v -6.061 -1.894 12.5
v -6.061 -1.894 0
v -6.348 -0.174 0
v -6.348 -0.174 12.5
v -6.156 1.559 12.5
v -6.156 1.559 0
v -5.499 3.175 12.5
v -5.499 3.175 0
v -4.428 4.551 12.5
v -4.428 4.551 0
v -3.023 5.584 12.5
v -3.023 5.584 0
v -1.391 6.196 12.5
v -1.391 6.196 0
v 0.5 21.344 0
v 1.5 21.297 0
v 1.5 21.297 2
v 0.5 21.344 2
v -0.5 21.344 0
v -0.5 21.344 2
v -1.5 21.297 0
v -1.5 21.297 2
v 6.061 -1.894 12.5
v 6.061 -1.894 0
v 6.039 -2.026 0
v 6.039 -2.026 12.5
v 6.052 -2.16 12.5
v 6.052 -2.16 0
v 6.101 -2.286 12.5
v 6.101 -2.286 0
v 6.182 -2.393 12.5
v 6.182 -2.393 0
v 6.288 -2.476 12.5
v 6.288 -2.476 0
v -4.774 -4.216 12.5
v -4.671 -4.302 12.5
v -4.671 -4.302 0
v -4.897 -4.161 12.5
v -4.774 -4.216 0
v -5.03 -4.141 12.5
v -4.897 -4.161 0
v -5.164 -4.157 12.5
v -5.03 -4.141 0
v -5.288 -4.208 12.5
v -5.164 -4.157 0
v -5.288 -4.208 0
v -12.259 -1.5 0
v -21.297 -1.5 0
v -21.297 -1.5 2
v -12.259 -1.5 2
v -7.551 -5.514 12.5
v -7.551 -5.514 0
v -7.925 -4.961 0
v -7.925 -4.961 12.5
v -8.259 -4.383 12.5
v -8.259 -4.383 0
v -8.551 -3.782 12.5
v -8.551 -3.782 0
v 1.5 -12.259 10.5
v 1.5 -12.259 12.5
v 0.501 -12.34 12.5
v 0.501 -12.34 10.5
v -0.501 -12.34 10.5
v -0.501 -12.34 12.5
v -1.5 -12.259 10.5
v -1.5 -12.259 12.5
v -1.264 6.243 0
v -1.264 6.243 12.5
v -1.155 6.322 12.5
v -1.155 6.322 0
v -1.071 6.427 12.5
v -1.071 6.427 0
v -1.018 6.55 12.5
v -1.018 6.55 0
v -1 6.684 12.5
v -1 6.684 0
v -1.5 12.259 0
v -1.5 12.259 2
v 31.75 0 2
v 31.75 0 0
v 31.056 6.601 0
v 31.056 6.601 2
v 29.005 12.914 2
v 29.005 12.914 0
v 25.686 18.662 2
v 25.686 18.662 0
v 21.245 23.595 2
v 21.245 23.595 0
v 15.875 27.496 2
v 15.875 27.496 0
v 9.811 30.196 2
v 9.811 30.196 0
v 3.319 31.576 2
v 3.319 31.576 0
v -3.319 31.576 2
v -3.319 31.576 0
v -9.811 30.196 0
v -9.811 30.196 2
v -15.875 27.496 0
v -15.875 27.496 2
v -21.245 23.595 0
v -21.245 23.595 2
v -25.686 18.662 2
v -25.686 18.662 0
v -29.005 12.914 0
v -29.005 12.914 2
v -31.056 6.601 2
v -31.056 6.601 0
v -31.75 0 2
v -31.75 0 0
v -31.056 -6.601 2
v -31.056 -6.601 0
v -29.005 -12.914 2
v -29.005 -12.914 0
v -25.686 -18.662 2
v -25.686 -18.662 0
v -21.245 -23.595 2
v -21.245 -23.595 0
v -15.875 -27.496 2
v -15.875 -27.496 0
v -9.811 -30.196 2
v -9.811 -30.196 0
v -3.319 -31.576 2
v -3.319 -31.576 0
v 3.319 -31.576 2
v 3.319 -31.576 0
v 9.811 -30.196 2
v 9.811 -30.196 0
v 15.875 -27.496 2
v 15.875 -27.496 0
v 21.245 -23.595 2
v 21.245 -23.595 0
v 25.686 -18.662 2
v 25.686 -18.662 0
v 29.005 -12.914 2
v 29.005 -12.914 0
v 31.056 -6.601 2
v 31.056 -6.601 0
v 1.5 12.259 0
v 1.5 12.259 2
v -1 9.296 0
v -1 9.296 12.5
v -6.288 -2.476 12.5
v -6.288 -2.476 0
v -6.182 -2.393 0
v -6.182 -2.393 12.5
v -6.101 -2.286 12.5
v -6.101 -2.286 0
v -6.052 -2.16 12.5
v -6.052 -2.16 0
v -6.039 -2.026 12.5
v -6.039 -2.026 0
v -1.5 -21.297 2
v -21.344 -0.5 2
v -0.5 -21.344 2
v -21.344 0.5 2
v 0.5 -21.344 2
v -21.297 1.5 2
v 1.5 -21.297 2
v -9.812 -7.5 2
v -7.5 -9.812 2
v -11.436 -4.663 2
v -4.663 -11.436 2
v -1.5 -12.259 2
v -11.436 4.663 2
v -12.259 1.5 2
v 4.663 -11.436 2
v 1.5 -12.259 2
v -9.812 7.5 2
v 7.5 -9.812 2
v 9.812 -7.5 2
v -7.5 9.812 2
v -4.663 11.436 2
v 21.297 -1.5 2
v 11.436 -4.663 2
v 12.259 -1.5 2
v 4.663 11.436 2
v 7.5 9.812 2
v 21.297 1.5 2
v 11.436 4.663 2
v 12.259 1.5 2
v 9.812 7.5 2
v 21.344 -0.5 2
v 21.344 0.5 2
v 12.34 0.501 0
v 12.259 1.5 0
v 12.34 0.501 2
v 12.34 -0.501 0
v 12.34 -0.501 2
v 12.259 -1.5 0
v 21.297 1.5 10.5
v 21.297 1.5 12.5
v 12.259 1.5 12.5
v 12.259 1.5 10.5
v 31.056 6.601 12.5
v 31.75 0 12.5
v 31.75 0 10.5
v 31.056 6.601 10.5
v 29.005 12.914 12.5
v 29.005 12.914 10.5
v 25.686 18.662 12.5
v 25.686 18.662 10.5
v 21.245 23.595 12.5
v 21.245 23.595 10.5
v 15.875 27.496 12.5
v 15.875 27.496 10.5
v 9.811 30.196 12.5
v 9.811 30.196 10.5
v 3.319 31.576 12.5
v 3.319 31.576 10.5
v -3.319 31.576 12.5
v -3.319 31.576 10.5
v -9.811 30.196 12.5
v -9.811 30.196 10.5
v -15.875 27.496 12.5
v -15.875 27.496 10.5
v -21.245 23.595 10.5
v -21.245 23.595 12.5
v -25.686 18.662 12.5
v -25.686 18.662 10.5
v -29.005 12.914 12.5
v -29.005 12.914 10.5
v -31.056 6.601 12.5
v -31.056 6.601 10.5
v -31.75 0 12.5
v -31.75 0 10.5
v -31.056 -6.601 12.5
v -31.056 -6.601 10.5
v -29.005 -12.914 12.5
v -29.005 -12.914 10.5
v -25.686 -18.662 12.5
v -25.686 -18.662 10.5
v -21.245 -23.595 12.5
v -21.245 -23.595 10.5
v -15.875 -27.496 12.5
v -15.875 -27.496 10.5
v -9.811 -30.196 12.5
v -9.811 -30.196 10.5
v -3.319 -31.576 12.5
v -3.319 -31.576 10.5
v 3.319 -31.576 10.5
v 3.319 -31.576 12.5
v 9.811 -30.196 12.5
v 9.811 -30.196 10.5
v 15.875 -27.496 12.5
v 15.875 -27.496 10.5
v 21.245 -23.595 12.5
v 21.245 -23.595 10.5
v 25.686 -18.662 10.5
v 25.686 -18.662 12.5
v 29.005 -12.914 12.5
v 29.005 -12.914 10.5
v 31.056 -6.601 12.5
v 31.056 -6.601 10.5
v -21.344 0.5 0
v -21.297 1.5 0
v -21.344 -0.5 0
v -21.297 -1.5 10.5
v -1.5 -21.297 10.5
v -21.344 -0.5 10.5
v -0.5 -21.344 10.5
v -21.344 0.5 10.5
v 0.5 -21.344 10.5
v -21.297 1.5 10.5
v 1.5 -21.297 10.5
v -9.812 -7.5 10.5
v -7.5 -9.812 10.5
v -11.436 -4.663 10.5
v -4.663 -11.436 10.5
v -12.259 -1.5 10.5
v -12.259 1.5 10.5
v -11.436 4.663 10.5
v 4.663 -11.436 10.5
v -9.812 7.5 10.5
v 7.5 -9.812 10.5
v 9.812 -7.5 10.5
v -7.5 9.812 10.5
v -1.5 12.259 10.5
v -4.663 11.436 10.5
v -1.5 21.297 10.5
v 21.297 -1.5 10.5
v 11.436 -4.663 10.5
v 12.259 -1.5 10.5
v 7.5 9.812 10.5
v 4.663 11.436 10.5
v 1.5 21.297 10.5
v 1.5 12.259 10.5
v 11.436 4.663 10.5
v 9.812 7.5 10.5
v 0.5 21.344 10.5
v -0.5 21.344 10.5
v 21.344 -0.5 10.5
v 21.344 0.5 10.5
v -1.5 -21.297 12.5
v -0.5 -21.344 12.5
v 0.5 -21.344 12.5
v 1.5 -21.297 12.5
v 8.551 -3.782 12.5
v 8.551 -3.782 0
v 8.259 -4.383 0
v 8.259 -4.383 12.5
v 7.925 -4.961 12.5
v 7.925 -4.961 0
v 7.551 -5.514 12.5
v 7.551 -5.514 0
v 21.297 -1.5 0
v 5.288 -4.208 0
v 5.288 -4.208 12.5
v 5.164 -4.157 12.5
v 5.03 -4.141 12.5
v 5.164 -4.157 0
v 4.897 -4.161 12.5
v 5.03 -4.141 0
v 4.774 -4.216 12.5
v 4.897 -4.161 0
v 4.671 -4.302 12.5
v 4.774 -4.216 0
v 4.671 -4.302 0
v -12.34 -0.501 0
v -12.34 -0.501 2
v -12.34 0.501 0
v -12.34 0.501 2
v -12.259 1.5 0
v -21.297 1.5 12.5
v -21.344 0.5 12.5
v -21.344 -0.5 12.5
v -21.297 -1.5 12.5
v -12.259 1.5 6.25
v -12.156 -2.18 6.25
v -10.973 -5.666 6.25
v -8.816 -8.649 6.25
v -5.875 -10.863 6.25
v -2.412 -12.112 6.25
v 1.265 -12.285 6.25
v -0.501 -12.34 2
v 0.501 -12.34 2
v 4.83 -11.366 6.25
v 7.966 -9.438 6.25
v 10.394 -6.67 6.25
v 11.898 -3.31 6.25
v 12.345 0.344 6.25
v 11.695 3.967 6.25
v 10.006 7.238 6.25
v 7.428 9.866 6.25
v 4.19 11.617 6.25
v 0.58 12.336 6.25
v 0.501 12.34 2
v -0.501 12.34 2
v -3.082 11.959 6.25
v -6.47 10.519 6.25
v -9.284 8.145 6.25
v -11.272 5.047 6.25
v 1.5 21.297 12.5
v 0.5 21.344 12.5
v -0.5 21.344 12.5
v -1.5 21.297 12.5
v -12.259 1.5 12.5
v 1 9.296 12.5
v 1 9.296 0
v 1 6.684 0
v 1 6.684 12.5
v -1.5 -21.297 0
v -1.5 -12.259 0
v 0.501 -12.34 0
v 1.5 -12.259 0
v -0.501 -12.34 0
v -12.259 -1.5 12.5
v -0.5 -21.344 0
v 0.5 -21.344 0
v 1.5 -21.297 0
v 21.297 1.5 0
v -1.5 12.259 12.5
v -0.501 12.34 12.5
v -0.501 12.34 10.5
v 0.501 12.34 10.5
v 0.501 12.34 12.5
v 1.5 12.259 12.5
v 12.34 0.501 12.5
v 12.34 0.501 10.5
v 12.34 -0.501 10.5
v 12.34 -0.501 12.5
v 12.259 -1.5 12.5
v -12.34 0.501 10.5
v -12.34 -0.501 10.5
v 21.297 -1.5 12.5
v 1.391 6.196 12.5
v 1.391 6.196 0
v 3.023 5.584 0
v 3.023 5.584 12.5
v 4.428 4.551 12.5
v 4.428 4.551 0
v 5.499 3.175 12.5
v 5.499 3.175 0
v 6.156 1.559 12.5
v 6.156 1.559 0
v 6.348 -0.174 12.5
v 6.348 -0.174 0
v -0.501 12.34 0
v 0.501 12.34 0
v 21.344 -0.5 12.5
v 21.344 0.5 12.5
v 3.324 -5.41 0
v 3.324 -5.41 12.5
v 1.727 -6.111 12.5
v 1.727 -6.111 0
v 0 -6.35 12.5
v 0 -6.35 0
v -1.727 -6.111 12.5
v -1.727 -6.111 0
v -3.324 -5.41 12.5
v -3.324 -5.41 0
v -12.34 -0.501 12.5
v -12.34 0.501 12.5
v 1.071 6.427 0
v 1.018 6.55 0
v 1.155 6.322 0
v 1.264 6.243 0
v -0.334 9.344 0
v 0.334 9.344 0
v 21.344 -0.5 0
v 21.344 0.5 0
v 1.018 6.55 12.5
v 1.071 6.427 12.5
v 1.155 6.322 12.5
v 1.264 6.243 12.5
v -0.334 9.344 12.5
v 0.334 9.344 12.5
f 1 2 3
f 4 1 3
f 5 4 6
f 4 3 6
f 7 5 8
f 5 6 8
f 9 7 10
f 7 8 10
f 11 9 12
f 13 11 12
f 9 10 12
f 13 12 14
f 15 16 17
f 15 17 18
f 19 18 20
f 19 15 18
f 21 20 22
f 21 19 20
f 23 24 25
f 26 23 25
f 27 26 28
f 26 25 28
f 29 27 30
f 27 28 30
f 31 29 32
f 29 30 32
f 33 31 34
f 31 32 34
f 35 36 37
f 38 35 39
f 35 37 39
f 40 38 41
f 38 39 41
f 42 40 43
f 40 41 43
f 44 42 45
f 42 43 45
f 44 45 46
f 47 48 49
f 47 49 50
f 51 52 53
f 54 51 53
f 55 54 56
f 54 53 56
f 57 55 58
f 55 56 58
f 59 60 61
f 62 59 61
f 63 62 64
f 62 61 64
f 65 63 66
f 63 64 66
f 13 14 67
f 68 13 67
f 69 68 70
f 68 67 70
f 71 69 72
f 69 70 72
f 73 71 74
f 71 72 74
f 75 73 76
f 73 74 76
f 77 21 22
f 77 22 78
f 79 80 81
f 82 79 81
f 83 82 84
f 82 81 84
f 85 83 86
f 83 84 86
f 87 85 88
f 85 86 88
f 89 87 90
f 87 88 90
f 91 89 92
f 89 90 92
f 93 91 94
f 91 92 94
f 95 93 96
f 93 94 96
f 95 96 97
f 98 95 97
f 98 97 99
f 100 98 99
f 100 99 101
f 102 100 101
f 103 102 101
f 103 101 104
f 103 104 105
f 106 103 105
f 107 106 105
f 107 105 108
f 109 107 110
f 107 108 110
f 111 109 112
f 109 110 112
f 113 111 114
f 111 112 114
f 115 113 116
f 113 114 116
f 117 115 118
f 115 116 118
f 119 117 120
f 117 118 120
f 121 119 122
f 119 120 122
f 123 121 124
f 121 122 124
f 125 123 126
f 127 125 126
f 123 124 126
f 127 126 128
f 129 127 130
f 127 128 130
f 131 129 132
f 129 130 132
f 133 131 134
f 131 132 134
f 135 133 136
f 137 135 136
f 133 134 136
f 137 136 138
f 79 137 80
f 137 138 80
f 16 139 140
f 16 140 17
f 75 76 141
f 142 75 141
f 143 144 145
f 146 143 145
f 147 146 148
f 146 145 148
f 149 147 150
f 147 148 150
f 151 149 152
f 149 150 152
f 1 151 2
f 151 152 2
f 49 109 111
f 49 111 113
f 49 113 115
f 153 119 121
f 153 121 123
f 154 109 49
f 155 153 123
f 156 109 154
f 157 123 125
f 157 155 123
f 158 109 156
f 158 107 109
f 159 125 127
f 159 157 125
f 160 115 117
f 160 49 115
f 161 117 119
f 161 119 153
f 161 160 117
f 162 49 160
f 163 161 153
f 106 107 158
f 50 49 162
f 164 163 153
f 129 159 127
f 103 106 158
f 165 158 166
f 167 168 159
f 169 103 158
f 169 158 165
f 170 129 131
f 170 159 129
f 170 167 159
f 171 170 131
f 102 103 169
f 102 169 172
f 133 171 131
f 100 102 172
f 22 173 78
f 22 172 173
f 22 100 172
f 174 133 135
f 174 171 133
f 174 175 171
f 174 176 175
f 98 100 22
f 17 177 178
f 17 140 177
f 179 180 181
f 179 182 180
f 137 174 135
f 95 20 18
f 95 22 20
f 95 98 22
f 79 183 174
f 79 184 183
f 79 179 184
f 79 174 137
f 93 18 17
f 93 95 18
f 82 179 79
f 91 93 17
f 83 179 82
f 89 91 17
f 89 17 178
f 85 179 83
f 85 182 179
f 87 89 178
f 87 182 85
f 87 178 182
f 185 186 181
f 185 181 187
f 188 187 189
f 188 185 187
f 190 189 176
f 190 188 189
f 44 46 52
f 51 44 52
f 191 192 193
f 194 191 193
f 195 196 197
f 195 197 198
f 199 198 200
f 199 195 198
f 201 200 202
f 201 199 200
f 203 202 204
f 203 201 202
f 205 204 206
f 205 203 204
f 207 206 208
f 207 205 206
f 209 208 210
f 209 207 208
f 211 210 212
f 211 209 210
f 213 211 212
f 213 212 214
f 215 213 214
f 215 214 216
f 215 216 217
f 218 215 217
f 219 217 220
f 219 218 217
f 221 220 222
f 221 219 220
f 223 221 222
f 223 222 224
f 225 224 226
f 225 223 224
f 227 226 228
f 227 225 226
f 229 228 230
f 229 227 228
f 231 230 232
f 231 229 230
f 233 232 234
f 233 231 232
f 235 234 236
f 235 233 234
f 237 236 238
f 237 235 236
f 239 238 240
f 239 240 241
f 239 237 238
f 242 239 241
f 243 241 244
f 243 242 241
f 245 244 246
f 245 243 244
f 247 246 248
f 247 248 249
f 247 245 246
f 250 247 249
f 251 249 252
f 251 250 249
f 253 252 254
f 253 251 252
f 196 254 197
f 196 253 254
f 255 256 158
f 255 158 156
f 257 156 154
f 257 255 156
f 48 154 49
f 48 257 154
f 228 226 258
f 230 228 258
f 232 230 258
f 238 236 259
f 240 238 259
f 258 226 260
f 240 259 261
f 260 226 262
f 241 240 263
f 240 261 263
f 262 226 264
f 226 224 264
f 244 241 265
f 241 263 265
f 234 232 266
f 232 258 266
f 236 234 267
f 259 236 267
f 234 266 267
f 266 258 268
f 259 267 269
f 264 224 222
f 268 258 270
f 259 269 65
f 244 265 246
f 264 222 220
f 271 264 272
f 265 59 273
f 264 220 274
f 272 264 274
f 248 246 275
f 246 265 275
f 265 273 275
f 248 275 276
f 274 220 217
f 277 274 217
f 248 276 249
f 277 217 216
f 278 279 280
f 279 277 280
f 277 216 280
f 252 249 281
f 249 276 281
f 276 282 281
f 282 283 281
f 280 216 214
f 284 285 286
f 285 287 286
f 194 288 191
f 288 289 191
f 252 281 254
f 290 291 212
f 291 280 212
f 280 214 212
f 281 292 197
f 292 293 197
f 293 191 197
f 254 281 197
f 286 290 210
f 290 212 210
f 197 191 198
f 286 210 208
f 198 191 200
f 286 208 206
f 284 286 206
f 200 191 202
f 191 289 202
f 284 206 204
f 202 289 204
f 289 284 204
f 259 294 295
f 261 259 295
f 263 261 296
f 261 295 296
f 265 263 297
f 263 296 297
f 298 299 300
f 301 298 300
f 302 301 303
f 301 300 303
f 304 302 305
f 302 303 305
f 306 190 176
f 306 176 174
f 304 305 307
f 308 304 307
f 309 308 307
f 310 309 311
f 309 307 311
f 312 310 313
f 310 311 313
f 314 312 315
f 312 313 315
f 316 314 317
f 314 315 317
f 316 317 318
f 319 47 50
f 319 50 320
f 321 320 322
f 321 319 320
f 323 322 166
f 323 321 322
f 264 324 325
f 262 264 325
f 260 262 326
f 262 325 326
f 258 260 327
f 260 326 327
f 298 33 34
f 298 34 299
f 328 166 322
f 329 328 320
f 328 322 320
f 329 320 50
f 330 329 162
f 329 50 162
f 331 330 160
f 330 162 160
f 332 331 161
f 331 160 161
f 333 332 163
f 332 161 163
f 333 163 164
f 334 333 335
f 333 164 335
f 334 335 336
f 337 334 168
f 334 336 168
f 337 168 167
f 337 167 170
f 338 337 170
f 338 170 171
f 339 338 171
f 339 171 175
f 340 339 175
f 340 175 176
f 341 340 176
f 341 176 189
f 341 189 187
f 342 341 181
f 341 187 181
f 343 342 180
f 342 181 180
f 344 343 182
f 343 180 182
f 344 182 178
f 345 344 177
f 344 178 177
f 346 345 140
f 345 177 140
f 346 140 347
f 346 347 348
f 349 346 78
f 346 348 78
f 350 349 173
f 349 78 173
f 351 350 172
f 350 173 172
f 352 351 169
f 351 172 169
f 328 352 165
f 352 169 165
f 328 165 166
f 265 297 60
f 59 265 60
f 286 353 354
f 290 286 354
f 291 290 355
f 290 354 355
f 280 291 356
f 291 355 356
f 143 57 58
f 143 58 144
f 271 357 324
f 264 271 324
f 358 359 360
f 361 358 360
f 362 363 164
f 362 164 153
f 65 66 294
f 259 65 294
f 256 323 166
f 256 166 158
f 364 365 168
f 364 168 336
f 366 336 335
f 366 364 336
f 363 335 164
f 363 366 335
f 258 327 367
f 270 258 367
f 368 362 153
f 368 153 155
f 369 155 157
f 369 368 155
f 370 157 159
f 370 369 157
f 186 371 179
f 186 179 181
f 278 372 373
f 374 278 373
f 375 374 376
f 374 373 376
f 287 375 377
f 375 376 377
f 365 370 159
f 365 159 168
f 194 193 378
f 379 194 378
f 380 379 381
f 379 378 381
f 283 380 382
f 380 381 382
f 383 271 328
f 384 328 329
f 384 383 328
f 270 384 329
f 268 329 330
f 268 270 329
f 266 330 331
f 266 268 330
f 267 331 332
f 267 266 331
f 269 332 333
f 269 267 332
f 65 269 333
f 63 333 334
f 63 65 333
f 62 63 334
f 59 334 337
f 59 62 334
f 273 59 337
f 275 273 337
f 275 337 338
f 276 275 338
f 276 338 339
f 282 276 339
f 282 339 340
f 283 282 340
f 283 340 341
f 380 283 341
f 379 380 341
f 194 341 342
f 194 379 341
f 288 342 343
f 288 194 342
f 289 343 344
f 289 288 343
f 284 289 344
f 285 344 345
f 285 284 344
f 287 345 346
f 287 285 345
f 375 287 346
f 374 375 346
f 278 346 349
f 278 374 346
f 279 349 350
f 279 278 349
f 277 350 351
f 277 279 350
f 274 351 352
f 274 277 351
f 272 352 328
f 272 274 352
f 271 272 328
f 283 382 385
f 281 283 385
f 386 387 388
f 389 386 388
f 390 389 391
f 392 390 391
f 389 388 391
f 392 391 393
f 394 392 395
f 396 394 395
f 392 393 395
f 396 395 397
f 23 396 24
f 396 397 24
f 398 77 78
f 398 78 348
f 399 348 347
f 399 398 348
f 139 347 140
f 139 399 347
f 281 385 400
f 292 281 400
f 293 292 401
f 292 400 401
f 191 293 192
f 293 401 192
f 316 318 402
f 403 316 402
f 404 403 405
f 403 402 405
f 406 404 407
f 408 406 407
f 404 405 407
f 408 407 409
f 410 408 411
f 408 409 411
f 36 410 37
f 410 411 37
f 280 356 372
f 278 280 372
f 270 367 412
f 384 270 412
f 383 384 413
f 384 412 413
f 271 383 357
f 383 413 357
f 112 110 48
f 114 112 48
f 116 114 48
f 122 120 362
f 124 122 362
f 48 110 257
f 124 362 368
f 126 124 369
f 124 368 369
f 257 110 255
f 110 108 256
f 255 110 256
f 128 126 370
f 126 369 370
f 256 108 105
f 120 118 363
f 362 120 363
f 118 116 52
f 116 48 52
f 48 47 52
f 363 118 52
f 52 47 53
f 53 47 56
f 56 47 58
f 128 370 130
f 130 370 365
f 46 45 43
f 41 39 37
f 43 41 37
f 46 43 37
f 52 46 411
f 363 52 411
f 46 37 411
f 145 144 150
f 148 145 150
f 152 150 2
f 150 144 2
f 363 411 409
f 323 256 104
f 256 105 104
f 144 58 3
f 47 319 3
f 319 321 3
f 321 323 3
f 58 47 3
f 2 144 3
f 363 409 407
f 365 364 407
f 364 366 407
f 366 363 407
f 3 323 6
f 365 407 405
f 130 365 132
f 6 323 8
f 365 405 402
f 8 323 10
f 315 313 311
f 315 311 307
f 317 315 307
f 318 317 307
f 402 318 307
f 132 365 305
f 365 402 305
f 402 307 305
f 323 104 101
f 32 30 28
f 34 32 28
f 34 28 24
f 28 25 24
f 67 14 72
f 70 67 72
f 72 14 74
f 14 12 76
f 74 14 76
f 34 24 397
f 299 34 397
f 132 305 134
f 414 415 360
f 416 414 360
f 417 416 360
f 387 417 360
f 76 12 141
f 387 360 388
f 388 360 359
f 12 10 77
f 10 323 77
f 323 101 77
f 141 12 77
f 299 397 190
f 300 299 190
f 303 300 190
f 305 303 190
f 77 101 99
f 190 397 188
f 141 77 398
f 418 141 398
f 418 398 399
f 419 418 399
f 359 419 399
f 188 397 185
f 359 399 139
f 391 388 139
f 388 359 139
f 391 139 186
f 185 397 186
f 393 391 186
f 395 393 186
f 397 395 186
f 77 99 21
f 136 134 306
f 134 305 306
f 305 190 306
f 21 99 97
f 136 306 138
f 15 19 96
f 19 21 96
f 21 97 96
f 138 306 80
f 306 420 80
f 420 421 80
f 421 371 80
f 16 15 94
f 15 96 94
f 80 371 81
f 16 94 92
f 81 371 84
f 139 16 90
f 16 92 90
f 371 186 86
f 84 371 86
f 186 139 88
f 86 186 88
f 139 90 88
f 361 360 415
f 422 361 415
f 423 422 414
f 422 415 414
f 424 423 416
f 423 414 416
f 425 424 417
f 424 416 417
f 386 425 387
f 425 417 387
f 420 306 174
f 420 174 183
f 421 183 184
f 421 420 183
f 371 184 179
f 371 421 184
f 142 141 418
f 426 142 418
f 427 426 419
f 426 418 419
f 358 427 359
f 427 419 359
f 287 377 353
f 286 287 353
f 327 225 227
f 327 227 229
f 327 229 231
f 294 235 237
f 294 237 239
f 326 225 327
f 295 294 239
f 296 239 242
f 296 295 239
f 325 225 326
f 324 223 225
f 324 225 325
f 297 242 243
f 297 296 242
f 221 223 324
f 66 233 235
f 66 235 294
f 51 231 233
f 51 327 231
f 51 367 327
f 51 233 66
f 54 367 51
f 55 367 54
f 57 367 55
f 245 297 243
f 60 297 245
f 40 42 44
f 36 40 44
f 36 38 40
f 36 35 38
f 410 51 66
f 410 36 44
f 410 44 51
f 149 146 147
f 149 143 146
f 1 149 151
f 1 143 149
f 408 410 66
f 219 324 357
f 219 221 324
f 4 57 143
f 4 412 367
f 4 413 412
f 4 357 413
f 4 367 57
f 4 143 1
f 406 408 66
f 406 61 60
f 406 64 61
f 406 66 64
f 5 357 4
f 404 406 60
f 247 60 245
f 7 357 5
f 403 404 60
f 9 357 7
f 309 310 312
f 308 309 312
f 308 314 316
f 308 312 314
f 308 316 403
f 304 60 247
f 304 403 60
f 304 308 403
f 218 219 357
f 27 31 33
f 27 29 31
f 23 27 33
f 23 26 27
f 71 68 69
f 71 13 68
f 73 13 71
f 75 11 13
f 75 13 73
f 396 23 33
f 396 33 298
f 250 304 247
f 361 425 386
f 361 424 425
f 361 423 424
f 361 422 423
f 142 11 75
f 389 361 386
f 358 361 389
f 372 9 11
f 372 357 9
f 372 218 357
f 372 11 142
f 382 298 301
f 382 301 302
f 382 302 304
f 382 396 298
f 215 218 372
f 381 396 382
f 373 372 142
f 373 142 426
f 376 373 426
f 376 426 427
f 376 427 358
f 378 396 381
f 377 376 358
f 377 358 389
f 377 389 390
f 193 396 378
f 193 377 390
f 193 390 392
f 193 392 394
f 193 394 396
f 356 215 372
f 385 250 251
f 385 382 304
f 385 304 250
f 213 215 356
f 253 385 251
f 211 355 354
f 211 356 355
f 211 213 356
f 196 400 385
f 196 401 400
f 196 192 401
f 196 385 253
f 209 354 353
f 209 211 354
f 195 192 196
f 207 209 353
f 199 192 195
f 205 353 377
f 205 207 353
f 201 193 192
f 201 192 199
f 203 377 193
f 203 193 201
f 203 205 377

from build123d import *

# Parameters (mm, degrees)
SKETCH1_R           = 31.75
BOSS_EXTRUDE1_DEPTH = 2
SKETCH3_R           = 12.35
BOSS_EXTRUDE3_DEPTH = 4.25
CUT_EXTRUDE1_DEPTH  = 47.608743815


with BuildPart() as part:
    # Sketch1 → Boss-Extrude1 (new body)
    with BuildSketch(Plane.XY):
        Circle(SKETCH1_R)
        with BuildLine():
            Line((1.5, 12.258568432), (1.5, 21.297241605))
            ThreePointArc((1.5, 21.297241605), (0, 21.35), (-1.5, 21.297241605))
            Line((-1.5, 21.297241605), (-1.5, 12.258568432))
            ThreePointArc((-1.5, 12.258568432), (0, 12.35), (1.5, 12.258568432))
        make_face(mode=Mode.SUBTRACT)
        with BuildLine():
            Line((-12.258568432, 1.5), (-21.297241605, 1.5))
            ThreePointArc((-21.297241605, 1.5), (-21.35, 0), (-21.297241605, -1.5))
            Line((-21.297241605, -1.5), (-12.258568432, -1.5))
            ThreePointArc((-12.258568432, -1.5), (-12.35, 0), (-12.258568432, 1.5))
        make_face(mode=Mode.SUBTRACT)
        with BuildLine():
            Line((-1.5, -12.258568432), (-1.5, -21.297241605))
            ThreePointArc((-1.5, -21.297241605), (0, -21.35), (1.5, -21.297241605))
            Line((1.5, -21.297241605), (1.5, -12.258568432))
            ThreePointArc((1.5, -12.258568432), (0, -12.35), (-1.5, -12.258568432))
        make_face(mode=Mode.SUBTRACT)
        with BuildLine():
            Line((12.258568432, -1.5), (21.297241605, -1.5))
            ThreePointArc((21.297241605, -1.5), (21.35, 0), (21.297241605, 1.5))
            Line((21.297241605, 1.5), (12.258568432, 1.5))
            ThreePointArc((12.258568432, 1.5), (12.35, 0), (12.258568432, -1.5))
        make_face(mode=Mode.SUBTRACT)
    extrude(amount=BOSS_EXTRUDE1_DEPTH)

    # Sketch3 → Boss-Extrude3 (add)
    with BuildSketch(Plane.XY.offset(2)):
        with Locations(Location((0, 0, 0), (0, 0, 173.023774077))):
            Circle(SKETCH3_R)
    extrude(amount=BOSS_EXTRUDE3_DEPTH)

    # Mirror1: part across plane


with BuildPart() as part_1:
    add(part.part)
    add(part.part.mirror(Plane.XY.offset(6.25)))

    # Sketch4 → Cut-Extrude1 (cut, through all)
    with BuildSketch(Plane(origin=(0, 0, 0), x_dir=(-1, 0, 0), z_dir=(0, 0, -1))):
        with BuildLine():
            Line((1, 6.683748948), (1, 9.296370259))
            ThreePointArc((1, 9.296370259), (0, 9.35), (-1, 9.296370259))
            Line((-1, 9.296370259), (-1, 6.683748948))
            ThreePointArc((-1, 6.683748948), (-1.109651101, 6.371294572), (-1.390510949, 6.195884061))
            ThreePointArc((-1.390510949, 6.195884061), (-5.499261314, 3.175), (-6.06104847, -1.893724225))
            ThreePointArc((-6.06104847, -1.893724225), (-6.072528505, -2.224661243), (-6.288296381, -2.47584907))
            Line((-6.288296381, -2.47584907), (-8.550892808, -3.782159726))
            ThreePointArc((-8.550892808, -3.782159726), (-8.097337525, -4.675), (-7.550892808, -5.514210533))
            Line((-7.550892808, -5.514210533), (-5.288296381, -4.207899878))
            ThreePointArc((-5.288296381, -4.207899878), (-4.962877404, -4.146633329), (-4.670537522, -4.302159837))
            ThreePointArc((-4.670537522, -4.302159837), (0, -6.35), (4.670537522, -4.302159837))
            ThreePointArc((4.670537522, -4.302159837), (4.962877404, -4.146633329), (5.288296381, -4.207899878))
            Line((5.288296381, -4.207899878), (7.550892808, -5.514210533))
            ThreePointArc((7.550892808, -5.514210533), (8.097337525, -4.675), (8.550892808, -3.782159726))
            Line((8.550892808, -3.782159726), (6.288296381, -2.47584907))
            ThreePointArc((6.288296381, -2.47584907), (6.072528505, -2.224661243), (6.06104847, -1.893724225))
            ThreePointArc((6.06104847, -1.893724225), (5.499261314, 3.175), (1.390510949, 6.195884061))
            ThreePointArc((1.390510949, 6.195884061), (1.109651101, 6.371294572), (1, 6.683748948))
        make_face()
    extrude(amount=-CUT_EXTRUDE1_DEPTH, mode=Mode.SUBTRACT)


solid = part_1.part
